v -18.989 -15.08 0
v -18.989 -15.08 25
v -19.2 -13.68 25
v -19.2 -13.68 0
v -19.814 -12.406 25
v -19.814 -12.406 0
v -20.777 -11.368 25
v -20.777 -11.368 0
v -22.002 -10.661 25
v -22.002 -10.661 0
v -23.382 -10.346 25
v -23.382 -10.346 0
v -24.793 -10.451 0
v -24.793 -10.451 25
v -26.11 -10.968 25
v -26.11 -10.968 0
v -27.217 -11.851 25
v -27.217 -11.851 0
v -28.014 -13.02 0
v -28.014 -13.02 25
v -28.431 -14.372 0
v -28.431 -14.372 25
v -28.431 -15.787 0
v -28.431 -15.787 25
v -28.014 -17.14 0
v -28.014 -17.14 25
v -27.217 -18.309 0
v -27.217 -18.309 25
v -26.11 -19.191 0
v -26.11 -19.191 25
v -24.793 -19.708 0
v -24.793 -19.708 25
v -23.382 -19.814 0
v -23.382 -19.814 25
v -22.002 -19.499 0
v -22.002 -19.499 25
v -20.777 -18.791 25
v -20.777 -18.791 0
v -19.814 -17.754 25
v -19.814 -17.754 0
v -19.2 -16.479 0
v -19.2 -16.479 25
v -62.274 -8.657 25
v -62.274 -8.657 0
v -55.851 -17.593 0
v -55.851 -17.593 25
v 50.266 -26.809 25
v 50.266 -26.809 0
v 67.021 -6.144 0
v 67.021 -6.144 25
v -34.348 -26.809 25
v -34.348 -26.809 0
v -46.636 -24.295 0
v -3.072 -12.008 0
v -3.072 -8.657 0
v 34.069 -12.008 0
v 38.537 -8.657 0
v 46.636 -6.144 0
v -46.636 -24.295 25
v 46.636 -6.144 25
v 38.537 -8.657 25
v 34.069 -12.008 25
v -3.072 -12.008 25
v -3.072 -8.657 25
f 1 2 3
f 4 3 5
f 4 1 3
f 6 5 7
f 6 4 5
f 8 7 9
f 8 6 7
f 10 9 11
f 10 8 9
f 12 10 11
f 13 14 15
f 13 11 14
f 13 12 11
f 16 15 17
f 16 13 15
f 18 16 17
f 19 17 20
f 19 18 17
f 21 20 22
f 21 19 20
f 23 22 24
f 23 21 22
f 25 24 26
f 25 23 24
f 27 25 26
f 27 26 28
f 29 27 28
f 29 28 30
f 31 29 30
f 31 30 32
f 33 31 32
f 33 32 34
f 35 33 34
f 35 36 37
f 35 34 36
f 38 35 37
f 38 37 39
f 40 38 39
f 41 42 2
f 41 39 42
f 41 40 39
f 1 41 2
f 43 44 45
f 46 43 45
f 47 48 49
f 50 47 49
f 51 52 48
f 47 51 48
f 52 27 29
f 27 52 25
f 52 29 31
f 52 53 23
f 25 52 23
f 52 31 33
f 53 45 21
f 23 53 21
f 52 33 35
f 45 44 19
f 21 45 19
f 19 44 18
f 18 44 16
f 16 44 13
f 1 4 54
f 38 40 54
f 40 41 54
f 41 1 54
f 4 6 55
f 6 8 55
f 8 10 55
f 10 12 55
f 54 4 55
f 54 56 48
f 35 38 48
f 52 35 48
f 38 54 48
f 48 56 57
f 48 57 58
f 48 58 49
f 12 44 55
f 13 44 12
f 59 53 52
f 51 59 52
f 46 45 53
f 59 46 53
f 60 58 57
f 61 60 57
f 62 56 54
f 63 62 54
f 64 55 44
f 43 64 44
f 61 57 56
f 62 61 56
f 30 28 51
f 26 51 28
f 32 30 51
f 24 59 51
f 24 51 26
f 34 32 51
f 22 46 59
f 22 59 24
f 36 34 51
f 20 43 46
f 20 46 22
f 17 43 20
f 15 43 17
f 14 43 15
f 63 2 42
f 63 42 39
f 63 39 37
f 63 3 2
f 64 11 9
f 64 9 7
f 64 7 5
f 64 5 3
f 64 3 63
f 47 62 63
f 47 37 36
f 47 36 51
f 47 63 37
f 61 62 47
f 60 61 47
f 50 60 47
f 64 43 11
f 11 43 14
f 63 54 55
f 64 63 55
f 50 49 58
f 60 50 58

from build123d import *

# Parameters (mm, degrees)
F1_DEPTH = 25
F2_R     = 4.747339
F3_DEPTH = 25.001


with BuildPart() as f1:
    # F0 (on Top) → F1 (new body)
    with BuildSketch(Plane.XY):
        Polygon((-34.348406, -26.808511), (-23.736702, -26.808511), (-10.332447, -26.808511), (4.468086, -26.808511), (22.898939, -26.808511), (38.537234, -26.808511), (50.26596, -26.808511), (67.021281, -6.143617), (46.635643, -6.143617), (38.537234, -8.656915), (34.069151, -12.00798), (-3.07181, -12.00798), (-3.07181, -8.656915), (-62.273938, -8.656915), (-55.851065, -17.593086), (-46.635639, -24.295213), align=None)
    extrude(amount=F1_DEPTH)

    # F2 (on Top) → F3 (cut, through all)
    with BuildSketch(Plane.XY):
        with Locations((-23.736702, -15.079788)):
            Circle(F2_R)
    extrude(amount=F3_DEPTH, mode=Mode.SUBTRACT)


solid = f1.part
